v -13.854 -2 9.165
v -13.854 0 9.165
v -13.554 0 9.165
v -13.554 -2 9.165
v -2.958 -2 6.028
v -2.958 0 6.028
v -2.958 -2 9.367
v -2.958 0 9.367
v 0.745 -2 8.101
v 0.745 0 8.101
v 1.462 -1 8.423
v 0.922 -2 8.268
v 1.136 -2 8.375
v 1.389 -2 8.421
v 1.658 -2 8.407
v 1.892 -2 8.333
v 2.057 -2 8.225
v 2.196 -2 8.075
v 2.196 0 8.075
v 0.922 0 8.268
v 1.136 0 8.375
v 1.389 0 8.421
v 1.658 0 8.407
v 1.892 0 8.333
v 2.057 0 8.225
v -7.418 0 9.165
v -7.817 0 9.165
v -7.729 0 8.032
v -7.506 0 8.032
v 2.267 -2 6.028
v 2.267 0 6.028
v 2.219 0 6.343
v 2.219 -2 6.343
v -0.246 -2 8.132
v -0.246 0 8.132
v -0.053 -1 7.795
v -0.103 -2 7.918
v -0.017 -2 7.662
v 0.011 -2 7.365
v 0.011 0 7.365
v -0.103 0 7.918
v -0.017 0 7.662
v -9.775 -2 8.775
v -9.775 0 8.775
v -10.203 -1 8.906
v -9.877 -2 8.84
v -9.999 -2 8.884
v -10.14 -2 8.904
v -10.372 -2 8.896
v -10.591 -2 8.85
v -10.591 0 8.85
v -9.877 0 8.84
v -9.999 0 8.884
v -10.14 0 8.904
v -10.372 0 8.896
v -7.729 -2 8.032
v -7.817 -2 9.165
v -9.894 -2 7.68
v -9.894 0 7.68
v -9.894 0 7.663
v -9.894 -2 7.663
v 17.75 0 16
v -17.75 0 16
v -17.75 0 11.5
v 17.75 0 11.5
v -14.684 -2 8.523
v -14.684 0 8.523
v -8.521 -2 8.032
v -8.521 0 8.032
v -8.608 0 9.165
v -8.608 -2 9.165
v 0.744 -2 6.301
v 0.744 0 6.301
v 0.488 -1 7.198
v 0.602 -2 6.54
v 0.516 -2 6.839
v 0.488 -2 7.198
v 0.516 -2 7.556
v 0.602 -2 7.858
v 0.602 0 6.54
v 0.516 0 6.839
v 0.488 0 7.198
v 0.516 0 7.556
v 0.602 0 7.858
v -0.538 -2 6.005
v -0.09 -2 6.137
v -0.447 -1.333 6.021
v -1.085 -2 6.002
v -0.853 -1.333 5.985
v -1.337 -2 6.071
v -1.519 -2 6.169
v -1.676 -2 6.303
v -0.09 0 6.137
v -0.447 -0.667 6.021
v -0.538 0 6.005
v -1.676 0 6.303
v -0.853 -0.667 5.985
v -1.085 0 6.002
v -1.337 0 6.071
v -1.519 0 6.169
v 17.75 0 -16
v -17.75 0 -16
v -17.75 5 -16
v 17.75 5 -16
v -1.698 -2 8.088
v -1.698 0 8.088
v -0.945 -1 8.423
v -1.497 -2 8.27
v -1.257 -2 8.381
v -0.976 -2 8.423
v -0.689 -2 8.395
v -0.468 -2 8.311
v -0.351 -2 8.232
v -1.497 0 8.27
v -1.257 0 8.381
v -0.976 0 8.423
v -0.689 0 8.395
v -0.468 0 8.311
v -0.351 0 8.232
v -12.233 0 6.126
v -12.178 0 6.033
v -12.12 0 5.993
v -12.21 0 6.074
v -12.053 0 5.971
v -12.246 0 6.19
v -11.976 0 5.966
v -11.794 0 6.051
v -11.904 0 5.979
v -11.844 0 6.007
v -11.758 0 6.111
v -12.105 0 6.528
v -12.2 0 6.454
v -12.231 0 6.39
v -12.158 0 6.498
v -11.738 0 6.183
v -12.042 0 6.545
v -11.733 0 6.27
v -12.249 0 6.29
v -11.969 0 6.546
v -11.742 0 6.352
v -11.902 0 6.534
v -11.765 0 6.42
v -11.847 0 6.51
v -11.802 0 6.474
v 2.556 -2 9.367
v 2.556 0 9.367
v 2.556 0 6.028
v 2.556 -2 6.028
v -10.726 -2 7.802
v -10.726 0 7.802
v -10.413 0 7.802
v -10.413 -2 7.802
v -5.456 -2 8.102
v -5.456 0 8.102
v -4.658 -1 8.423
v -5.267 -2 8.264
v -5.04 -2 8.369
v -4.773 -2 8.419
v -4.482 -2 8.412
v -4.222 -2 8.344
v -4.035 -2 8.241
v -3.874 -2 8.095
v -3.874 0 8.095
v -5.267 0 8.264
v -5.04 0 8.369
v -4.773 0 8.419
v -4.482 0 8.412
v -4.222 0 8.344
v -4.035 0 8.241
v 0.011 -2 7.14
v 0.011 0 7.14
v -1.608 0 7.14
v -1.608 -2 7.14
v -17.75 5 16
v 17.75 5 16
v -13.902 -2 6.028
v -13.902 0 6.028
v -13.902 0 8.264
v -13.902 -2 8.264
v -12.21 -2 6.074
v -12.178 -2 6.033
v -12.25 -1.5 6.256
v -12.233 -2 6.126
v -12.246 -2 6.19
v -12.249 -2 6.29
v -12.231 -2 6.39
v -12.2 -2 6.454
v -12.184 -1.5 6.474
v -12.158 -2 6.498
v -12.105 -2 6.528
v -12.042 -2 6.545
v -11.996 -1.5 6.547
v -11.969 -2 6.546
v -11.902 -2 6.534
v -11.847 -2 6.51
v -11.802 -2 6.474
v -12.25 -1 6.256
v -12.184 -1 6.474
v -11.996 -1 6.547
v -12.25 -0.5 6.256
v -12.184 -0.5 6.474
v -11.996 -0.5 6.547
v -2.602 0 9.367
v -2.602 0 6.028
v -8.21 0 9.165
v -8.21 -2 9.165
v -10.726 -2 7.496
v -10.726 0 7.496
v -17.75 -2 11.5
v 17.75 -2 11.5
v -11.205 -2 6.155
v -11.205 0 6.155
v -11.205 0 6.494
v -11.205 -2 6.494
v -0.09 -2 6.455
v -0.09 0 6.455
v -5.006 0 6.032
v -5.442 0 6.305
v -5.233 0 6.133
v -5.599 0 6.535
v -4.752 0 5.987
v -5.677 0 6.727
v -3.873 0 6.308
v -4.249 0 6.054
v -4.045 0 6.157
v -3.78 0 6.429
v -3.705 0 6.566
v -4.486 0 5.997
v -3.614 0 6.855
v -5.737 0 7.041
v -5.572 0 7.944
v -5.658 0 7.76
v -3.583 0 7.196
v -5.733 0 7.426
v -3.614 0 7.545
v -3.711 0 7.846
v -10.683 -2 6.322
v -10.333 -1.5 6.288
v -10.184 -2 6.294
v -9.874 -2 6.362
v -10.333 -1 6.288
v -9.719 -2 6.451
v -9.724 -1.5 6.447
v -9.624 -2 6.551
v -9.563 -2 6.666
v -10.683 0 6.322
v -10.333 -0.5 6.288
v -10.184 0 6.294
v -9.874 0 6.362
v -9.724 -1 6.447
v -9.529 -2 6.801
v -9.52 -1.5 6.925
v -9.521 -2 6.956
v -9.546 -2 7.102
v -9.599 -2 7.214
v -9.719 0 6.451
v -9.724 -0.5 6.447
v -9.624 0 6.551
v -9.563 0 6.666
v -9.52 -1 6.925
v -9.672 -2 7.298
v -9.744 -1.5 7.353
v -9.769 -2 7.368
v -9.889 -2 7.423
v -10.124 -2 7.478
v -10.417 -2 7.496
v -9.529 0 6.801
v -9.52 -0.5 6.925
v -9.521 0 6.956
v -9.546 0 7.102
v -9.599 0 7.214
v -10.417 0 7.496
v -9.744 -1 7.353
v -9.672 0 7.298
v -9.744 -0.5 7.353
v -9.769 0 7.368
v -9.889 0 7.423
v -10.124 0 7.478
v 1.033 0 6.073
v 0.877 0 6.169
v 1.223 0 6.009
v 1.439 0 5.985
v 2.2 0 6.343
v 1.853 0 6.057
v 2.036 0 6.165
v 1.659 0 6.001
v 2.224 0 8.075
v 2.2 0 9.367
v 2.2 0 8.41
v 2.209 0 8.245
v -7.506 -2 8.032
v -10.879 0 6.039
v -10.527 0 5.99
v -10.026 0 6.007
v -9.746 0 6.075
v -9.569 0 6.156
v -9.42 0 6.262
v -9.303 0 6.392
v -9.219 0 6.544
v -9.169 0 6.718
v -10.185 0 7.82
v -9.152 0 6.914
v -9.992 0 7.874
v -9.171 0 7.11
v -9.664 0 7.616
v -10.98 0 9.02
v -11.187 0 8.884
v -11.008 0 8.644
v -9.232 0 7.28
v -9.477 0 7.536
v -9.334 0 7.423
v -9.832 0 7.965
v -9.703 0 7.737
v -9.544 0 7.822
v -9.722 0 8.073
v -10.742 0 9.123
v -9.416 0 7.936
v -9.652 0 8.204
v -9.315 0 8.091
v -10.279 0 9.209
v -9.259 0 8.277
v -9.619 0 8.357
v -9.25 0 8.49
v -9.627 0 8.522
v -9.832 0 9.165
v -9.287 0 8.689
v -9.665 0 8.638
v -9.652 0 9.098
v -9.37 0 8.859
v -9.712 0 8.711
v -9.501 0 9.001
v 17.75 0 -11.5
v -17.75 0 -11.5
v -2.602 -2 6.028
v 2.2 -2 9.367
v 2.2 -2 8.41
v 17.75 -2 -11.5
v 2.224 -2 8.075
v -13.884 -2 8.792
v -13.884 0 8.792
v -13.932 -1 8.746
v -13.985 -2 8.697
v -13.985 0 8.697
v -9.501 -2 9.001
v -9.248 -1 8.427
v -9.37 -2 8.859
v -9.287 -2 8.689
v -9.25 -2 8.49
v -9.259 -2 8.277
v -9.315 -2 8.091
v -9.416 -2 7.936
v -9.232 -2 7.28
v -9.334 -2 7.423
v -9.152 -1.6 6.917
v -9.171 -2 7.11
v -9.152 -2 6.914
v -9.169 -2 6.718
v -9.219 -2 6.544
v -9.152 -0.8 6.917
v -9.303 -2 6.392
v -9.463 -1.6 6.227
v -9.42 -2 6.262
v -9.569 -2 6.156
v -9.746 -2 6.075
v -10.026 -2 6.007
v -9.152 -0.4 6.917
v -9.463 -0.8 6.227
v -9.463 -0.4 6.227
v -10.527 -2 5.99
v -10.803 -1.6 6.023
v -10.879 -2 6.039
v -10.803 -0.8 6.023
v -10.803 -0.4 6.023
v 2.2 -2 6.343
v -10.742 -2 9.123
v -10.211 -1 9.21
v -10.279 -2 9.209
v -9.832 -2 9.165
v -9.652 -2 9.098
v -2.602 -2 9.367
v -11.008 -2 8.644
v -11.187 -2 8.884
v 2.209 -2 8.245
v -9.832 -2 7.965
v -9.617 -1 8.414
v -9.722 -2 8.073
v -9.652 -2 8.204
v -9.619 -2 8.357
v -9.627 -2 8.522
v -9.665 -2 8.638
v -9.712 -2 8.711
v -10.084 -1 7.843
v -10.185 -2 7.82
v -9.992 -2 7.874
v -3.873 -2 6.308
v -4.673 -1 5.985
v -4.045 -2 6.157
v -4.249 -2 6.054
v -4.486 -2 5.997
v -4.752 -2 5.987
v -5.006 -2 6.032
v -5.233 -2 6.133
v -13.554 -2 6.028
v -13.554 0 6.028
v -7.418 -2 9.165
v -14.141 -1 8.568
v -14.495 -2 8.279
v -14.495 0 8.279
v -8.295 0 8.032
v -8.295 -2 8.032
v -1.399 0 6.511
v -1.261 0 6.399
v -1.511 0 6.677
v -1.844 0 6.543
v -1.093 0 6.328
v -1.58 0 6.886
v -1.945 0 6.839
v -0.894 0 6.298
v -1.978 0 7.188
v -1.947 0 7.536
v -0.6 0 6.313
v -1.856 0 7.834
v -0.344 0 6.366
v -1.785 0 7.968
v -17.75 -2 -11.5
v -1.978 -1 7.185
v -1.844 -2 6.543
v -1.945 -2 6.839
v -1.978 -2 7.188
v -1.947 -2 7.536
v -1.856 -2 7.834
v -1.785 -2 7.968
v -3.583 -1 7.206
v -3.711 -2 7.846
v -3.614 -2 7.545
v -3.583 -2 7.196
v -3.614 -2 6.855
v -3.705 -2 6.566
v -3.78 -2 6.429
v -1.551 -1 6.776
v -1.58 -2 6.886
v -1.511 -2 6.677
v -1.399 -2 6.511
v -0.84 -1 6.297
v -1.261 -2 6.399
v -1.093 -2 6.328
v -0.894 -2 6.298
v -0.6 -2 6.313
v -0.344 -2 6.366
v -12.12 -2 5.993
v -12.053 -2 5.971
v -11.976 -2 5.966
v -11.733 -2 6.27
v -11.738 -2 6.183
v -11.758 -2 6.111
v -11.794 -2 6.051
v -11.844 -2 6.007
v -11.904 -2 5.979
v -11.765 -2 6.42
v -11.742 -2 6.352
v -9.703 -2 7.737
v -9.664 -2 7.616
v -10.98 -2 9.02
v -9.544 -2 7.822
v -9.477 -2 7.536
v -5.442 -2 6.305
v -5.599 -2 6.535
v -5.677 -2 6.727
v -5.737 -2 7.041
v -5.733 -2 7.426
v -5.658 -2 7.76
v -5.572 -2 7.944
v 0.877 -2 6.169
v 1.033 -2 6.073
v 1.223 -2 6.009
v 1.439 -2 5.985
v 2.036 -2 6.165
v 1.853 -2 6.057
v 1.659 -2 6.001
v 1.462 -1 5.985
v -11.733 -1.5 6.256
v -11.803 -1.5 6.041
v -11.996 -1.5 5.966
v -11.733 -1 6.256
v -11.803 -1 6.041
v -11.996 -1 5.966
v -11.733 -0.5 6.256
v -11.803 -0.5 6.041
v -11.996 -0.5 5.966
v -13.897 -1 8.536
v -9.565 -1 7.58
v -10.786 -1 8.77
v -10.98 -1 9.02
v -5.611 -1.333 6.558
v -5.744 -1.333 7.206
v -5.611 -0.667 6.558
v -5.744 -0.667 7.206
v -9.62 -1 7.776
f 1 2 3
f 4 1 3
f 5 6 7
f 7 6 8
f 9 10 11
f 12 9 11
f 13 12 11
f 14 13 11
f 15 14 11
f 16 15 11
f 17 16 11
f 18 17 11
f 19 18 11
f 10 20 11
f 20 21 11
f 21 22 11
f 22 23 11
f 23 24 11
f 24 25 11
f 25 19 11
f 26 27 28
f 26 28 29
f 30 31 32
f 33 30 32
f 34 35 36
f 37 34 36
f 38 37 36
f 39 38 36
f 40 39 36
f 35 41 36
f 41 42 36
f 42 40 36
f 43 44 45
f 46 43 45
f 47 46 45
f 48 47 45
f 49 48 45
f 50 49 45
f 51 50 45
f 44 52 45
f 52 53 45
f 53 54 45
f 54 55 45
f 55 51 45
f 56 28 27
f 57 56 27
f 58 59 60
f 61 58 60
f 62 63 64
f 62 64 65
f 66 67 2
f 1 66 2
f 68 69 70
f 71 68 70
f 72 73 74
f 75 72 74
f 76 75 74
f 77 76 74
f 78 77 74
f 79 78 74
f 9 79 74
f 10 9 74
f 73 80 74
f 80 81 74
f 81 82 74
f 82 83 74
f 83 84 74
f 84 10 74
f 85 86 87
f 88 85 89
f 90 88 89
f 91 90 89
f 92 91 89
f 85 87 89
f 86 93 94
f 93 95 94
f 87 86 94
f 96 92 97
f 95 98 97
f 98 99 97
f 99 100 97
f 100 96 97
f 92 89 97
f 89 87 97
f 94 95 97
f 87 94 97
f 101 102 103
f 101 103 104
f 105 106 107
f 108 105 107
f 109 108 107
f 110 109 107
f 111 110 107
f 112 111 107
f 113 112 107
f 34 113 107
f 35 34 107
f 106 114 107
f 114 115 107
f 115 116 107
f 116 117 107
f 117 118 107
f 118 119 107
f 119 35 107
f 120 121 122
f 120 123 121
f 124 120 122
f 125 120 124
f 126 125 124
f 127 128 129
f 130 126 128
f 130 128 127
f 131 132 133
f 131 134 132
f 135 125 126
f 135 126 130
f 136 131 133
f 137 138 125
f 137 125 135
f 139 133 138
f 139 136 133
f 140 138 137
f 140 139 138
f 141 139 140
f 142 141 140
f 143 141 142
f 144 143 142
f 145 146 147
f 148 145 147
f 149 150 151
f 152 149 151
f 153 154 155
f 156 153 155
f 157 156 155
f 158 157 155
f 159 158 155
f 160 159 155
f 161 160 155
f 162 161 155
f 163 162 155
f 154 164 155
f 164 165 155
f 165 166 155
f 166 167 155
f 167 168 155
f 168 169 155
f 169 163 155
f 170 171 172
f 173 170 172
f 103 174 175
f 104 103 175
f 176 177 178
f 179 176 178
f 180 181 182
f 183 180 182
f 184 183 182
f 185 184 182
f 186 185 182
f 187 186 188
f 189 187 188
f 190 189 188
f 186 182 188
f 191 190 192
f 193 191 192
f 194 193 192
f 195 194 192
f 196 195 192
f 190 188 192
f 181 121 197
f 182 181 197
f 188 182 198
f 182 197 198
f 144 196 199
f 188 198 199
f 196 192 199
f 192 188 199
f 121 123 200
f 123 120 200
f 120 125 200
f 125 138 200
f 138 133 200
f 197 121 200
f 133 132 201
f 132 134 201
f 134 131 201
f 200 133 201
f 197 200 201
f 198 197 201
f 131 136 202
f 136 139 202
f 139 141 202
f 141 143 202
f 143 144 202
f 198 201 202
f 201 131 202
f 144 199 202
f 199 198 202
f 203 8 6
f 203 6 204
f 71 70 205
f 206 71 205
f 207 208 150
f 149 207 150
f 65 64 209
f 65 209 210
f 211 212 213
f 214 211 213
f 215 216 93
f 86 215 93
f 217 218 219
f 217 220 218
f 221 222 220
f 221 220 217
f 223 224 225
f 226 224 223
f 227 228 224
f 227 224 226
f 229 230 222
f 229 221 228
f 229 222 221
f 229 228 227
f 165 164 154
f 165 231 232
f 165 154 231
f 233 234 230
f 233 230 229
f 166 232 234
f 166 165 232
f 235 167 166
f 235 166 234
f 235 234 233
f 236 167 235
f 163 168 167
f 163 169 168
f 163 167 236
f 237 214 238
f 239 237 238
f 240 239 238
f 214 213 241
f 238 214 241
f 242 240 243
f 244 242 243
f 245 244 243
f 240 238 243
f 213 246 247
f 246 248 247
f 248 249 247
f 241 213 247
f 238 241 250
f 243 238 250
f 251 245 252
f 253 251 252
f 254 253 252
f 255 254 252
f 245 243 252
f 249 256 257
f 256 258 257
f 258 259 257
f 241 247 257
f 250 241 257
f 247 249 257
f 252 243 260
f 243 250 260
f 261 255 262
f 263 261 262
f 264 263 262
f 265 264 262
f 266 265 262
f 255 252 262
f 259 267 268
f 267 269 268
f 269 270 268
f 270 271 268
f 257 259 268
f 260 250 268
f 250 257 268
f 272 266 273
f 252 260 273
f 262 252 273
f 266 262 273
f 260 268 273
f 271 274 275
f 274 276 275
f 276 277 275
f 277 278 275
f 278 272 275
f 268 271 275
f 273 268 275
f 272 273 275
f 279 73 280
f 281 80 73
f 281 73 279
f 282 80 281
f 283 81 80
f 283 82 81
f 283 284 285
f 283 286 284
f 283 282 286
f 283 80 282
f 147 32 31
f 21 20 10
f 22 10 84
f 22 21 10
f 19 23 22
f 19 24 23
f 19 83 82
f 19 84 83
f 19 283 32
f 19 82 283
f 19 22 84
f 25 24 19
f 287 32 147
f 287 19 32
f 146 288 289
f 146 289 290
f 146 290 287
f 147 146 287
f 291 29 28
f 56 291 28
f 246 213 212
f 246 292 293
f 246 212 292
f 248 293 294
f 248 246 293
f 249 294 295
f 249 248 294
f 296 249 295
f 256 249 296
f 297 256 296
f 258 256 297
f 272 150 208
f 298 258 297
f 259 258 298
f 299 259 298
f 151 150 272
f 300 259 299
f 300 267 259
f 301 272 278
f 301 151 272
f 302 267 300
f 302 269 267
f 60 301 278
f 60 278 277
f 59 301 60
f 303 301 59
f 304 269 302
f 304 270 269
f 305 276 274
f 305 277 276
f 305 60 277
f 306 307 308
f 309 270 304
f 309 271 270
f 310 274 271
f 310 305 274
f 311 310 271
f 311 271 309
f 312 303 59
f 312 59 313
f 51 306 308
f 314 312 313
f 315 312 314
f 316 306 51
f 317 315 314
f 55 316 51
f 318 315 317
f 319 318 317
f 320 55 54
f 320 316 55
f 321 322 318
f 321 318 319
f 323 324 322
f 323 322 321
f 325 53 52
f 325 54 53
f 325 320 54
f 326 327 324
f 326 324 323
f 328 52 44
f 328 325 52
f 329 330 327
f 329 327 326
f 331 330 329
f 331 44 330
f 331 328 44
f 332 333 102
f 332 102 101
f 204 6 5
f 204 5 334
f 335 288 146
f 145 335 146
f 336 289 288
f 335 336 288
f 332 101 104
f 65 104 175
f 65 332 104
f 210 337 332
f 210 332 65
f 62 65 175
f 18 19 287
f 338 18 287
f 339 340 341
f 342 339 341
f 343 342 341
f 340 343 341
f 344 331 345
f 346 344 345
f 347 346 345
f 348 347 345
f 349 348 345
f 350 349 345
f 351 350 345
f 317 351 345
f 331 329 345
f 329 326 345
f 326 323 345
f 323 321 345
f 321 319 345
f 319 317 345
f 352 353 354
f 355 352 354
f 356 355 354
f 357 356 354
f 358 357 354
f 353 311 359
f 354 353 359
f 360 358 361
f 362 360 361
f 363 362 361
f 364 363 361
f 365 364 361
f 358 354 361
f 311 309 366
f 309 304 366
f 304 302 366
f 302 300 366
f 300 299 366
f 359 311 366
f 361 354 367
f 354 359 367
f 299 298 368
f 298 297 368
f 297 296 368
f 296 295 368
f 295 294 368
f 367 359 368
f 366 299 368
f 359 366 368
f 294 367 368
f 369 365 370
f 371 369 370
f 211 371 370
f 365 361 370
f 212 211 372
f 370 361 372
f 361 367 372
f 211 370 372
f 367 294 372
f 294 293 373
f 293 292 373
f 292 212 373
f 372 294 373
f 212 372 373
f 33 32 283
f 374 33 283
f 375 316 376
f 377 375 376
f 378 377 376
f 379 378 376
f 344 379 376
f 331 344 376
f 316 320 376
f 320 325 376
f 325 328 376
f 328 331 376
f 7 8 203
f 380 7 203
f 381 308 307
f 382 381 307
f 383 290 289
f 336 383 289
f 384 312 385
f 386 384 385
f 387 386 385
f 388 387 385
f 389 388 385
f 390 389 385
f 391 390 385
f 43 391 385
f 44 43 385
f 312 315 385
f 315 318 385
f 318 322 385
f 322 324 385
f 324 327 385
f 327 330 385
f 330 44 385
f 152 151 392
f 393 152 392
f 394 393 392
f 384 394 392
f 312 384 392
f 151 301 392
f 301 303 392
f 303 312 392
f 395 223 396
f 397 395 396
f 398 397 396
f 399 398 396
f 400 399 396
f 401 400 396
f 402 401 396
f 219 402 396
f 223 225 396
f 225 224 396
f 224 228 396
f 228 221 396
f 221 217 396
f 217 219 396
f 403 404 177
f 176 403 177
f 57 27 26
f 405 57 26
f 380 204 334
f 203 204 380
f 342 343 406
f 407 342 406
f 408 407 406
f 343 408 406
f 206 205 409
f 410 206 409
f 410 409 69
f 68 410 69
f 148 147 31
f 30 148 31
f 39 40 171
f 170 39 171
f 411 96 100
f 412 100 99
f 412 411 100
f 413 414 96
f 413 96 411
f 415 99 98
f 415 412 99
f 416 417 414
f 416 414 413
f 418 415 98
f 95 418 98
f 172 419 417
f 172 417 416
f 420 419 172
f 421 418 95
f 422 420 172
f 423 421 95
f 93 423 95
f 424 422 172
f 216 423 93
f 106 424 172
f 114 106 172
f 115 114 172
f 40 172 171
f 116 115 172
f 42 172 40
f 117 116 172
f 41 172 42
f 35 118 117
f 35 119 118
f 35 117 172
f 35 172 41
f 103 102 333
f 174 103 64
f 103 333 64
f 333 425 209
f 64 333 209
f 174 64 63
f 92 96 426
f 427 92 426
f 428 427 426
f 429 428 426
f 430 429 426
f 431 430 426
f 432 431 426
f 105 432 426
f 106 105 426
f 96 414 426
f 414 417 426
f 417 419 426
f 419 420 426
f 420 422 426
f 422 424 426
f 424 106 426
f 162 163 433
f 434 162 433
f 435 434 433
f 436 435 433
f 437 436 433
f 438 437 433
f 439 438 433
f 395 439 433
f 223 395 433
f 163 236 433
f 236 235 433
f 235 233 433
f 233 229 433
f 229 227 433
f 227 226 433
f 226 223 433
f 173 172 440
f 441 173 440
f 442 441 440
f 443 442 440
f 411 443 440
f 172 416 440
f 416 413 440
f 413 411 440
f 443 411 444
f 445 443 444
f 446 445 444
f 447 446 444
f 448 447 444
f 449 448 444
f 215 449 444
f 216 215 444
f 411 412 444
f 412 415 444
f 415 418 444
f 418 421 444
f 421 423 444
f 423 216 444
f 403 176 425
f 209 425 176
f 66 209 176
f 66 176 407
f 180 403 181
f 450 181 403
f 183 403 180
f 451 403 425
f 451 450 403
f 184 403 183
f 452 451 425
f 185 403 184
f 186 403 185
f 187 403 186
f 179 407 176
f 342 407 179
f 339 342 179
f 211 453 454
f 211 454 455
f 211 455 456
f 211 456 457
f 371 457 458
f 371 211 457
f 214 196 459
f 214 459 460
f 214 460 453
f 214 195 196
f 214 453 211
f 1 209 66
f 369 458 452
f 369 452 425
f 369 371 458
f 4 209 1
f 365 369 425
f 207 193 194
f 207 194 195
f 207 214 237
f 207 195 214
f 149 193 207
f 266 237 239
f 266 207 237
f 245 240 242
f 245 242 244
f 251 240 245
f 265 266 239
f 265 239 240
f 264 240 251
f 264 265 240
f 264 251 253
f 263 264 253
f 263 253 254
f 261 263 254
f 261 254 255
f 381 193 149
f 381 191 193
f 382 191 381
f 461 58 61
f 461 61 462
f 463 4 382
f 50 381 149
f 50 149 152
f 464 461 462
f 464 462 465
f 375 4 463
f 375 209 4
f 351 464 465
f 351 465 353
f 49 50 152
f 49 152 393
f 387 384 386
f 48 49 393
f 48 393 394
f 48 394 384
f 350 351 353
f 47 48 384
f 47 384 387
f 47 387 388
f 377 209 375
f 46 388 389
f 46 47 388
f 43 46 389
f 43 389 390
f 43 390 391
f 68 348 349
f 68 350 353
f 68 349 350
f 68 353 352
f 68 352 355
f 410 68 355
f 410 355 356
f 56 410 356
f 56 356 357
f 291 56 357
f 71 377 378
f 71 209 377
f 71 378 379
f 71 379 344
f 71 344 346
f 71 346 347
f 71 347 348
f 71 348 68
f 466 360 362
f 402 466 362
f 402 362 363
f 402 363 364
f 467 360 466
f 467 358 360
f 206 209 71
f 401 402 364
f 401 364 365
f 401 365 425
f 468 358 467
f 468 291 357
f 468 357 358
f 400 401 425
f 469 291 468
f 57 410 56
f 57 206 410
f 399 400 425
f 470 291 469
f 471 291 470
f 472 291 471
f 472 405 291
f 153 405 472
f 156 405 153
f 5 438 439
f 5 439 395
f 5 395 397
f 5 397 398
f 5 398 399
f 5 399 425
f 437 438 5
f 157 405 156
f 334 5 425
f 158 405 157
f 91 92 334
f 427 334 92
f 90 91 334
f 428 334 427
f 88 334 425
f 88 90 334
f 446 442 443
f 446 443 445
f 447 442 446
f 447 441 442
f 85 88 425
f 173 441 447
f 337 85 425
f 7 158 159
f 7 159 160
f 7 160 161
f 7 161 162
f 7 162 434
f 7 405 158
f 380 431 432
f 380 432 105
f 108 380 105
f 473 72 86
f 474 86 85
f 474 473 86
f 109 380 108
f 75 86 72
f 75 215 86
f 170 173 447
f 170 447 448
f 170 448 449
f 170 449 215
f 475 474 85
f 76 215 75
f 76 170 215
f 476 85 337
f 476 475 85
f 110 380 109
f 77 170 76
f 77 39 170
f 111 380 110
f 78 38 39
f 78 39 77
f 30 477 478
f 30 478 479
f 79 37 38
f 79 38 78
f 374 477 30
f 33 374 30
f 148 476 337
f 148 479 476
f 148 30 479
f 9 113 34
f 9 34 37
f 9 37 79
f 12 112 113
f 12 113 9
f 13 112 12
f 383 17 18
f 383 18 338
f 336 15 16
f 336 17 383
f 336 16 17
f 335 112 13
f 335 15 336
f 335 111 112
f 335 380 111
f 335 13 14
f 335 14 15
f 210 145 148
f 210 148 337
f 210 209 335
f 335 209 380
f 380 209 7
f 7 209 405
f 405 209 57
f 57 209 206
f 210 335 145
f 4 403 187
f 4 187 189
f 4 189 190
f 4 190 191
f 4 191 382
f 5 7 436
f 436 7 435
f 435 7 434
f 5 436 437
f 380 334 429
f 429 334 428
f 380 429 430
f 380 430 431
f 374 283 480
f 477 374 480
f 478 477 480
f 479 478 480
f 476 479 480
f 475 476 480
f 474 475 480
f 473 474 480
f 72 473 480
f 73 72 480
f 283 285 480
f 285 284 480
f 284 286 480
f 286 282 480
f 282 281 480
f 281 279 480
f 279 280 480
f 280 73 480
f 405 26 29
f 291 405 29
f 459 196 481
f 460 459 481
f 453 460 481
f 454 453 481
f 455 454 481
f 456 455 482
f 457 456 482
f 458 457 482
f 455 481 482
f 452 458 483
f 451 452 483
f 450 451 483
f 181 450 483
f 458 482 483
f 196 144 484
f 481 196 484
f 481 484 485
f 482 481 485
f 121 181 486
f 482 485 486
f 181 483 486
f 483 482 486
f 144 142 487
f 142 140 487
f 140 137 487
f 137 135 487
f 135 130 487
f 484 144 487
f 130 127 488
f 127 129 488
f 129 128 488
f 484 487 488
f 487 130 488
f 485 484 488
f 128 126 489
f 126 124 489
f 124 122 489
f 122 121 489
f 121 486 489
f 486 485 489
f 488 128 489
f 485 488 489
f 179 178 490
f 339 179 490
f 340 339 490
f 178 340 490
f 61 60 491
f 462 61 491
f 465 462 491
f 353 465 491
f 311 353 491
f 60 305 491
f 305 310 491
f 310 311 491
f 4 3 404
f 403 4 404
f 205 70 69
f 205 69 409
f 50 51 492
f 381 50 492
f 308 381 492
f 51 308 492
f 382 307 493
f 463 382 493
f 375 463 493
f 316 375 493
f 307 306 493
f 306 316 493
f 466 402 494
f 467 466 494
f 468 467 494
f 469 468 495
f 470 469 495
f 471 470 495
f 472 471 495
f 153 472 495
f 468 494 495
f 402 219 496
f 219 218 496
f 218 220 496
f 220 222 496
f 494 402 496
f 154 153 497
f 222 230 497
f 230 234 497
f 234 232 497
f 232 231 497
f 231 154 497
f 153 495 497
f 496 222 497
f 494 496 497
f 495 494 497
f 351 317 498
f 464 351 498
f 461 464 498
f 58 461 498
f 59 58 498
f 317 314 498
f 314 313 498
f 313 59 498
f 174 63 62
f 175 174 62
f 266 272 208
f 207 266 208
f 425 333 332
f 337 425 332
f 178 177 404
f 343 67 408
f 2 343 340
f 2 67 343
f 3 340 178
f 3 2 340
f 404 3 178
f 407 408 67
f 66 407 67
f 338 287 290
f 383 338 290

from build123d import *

# Parameters (mm, degrees)
F0_W     = 35.5
F0_H     = 23
F0_W_2   = 0.3563508465
F0_H_2   = 3.3389868337
F1_DEPTH = 2
F2_W     = 35.5
F2_H     = 32
F3_DEPTH = 5


with BuildPart() as f1:
    # F0 (on Front) → F1 (new body)
    with BuildSketch(Plane.XZ):
        Rectangle(F0_W, F0_H)
        with BuildLine():
            Line((-13.5541488121, 9.1653992852), (-13.5541488121, 6.0282759368))
            Line((-13.5541488121, 6.0282759368), (-13.9015737223, 6.0282759368))
            Line((-13.9015737223, 6.0282759368), (-13.9015737223, 8.2638797062))
            add(Edge.make_bspline(
                [(-13.9015737223, 8.2638797062), (-13.9015737223, 8.5433301774), (-13.8844084599, 8.7918831763)],
                knots=[0, 0, 0, 1, 1, 1], degree=2))
            add(Edge.make_bspline(
                [(-13.8844084599, 8.7918831763), (-13.929038142, 8.7465668837), (-13.9849968973, 8.6974742334)],
                knots=[0, 0, 0, 1, 1, 1], degree=2))
            add(Edge.make_bspline(
                [(-13.9849968973, 8.6974742334), (-14.0409556526, 8.648381583), (-14.4954917998, 8.2789851371)],
                knots=[0, 0, 0, 1, 1, 1], degree=2))
            Line((-14.4954917998, 8.2789851371), (-14.6843096857, 8.5234184731))
            Line((-14.6843096857, 8.5234184731), (-13.8541975981, 9.1653992852))
            Line((-13.8541975981, 9.1653992852), (-13.5541488121, 9.1653992852))
        make_face(mode=Mode.SUBTRACT)
        with BuildLine():
            add(Edge.make_bspline(
                [(-12.1778380763, 6.0334255155), (-12.249588873, 6.1010566492), (-12.249588873, 6.2555440105)],
                knots=[0, 0, 0, 1, 1, 1], degree=2))
            add(Edge.make_bspline(
                [(-12.249588873, 6.2555440105), (-12.249588873, 6.3997322143), (-12.1840175708, 6.4735428424)],
                knots=[0, 0, 0, 1, 1, 1], degree=2))
            add(Edge.make_bspline(
                [(-12.1840175708, 6.4735428424), (-12.1184462686, 6.5473534705), (-11.9962296006, 6.5473534705)],
                knots=[0, 0, 0, 1, 1, 1], degree=2))
            add(Edge.make_bspline(
                [(-11.9962296006, 6.5473534705), (-11.8719531011, 6.5473534705), (-11.802262136, 6.4735428424)],
                knots=[0, 0, 0, 1, 1, 1], degree=2))
            add(Edge.make_bspline(
                [(-11.802262136, 6.4735428424), (-11.7325711708, 6.3997322143), (-11.7325711708, 6.2555440105)],
                knots=[0, 0, 0, 1, 1, 1], degree=2))
            add(Edge.make_bspline(
                [(-11.7325711708, 6.2555440105), (-11.7325711708, 6.1161620801), (-11.8032920517, 6.040978231)],
                knots=[0, 0, 0, 1, 1, 1], degree=2))
            add(Edge.make_bspline(
                [(-11.8032920517, 6.040978231), (-11.8740129326, 5.9657943819), (-11.9962296006, 5.9657943819)],
                knots=[0, 0, 0, 1, 1, 1], degree=2))
            add(Edge.make_bspline(
                [(-11.9962296006, 5.9657943819), (-12.1060872797, 5.9657943819), (-12.1778380763, 6.0334255155)],
                knots=[0, 0, 0, 1, 1, 1], degree=2))
        make_face(mode=Mode.SUBTRACT)
        with BuildLine():
            add(Edge.make_bspline(
                [(-9.5010870644, 9.0009560719), (-9.247727792, 8.7918831763), (-9.247727792, 8.4272930039)],
                knots=[0, 0, 0, 1, 1, 1], degree=2))
            add(Edge.make_bspline(
                [(-9.247727792, 8.4272930039), (-9.247727792, 8.1265576074), (-9.4162906683, 7.93567989)],
                knots=[0, 0, 0, 1, 1, 1], degree=2))
            add(Edge.make_bspline(
                [(-9.4162906683, 7.93567989), (-9.5848535447, 7.7448021726), (-9.8938282671, 7.6802607861)],
                knots=[0, 0, 0, 1, 1, 1], degree=2))
            Line((-9.8938282671, 7.6802607861), (-9.8938282671, 7.6630955237))
            add(Edge.make_bspline(
                [(-9.8938282671, 7.6630955237), (-9.5161924952, 7.6164060101), (-9.333897409, 7.423125156)],
                knots=[0, 0, 0, 1, 1, 1], degree=2))
            add(Edge.make_bspline(
                [(-9.333897409, 7.423125156), (-9.1516023228, 7.2298443018), (-9.1516023228, 6.9167499165)],
                knots=[0, 0, 0, 1, 1, 1], degree=2))
            add(Edge.make_bspline(
                [(-9.1516023228, 6.9167499165), (-9.1516023228, 6.4683932637), (-9.4626368767, 6.2267063697)],
                knots=[0, 0, 0, 1, 1, 1], degree=2))
            add(Edge.make_bspline(
                [(-9.4626368767, 6.2267063697), (-9.7736714306, 5.9850194757), (-10.3463045828, 5.9850194757)],
                knots=[0, 0, 0, 1, 1, 1], degree=2))
            add(Edge.make_bspline(
                [(-10.3463045828, 5.9850194757), (-10.5955441923, 5.9850194757), (-10.8025572563, 6.0227830529)],
                knots=[0, 0, 0, 1, 1, 1], degree=2))
            add(Edge.make_bspline(
                [(-10.8025572563, 6.0227830529), (-11.0095703203, 6.0605466301), (-11.2045677007, 6.1546122678)],
                knots=[0, 0, 0, 1, 1, 1], degree=2))
            Line((-11.2045677007, 6.1546122678), (-11.2045677007, 6.493797852))
            add(Edge.make_bspline(
                [(-11.2045677007, 6.493797852), (-11.0006443839, 6.3928661093), (-10.7699432578, 6.3403404065)],
                knots=[0, 0, 0, 1, 1, 1], degree=2))
            add(Edge.make_bspline(
                [(-10.7699432578, 6.3403404065), (-10.5392421317, 6.2878147037), (-10.3332589834, 6.2878147037)],
                knots=[0, 0, 0, 1, 1, 1], degree=2))
            add(Edge.make_bspline(
                [(-10.3332589834, 6.2878147037), (-9.5203121582, 6.2878147037), (-9.5203121582, 6.9249892424)],
                knots=[0, 0, 0, 1, 1, 1], degree=2))
            add(Edge.make_bspline(
                [(-9.5203121582, 6.9249892424), (-9.5203121582, 7.4962491736), (-10.4170254637, 7.4962491736)],
                knots=[0, 0, 0, 1, 1, 1], degree=2))
            Line((-10.4170254637, 7.4962491736), (-10.7260001862, 7.4962491736))
            Line((-10.7260001862, 7.4962491736), (-10.7260001862, 7.8024774541))
            Line((-10.7260001862, 7.8024774541), (-10.4129058008, 7.8024774541))
            add(Edge.make_bspline(
                [(-10.4129058008, 7.8024774541), (-10.0462557968, 7.8024774541), (-9.8316900174, 7.9645175307)],
                knots=[0, 0, 0, 1, 1, 1], degree=2))
            add(Edge.make_bspline(
                [(-9.8316900174, 7.9645175307), (-9.6171242379, 8.1265576074), (-9.6171242379, 8.4142474045)],
                knots=[0, 0, 0, 1, 1, 1], degree=2))
            add(Edge.make_bspline(
                [(-9.6171242379, 8.4142474045), (-9.6171242379, 8.6435753096), (-9.7747013463, 8.774717914)],
                knots=[0, 0, 0, 1, 1, 1], degree=2))
            add(Edge.make_bspline(
                [(-9.7747013463, 8.774717914), (-9.9322784548, 8.9058605184), (-10.2028029895, 8.9058605184)],
                knots=[0, 0, 0, 1, 1, 1], degree=2))
            add(Edge.make_bspline(
                [(-10.2028029895, 8.9058605184), (-10.4087861378, 8.9058605184), (-10.591081224, 8.8499017631)],
                knots=[0, 0, 0, 1, 1, 1], degree=2))
            add(Edge.make_bspline(
                [(-10.591081224, 8.8499017631), (-10.7733763103, 8.7939430078), (-11.0075104888, 8.6435753096)],
                knots=[0, 0, 0, 1, 1, 1], degree=2))
            Line((-11.0075104888, 8.6435753096), (-11.1874024383, 8.8838889826))
            add(Edge.make_bspline(
                [(-11.1874024383, 8.8838889826), (-10.9944648894, 9.0363165123), (-10.742478838, 9.1231727398)],
                knots=[0, 0, 0, 1, 1, 1], degree=2))
            add(Edge.make_bspline(
                [(-10.742478838, 9.1231727398), (-10.4904927866, 9.2100289674), (-10.2110423155, 9.2100289674)],
                knots=[0, 0, 0, 1, 1, 1], degree=2))
            add(Edge.make_bspline(
                [(-10.2110423155, 9.2100289674), (-9.7544463368, 9.2100289674), (-9.5010870644, 9.0009560719)],
                knots=[0, 0, 0, 1, 1, 1], degree=2))
        make_face(mode=Mode.SUBTRACT)
        Polygon((-8.6084934218, 9.1653992852), (-8.2095727246, 9.1653992852), (-8.2953990364, 8.0324919697), (-8.5206072785, 8.0324919697), align=None, mode=Mode.SUBTRACT)
        Polygon((-7.8168315219, 9.1653992852), (-7.4179108247, 9.1653992852), (-7.505796968, 8.0324919697), (-7.7289453786, 8.0324919697), align=None, mode=Mode.SUBTRACT)
        with BuildLine():
            add(Edge.make_bspline(
                [(-3.8739707584, 8.0946302194), (-3.5831912141, 7.7660870979), (-3.5831912141, 7.206499545)],
                knots=[0, 0, 0, 1, 1, 1], degree=2))
            add(Edge.make_bspline(
                [(-3.5831912141, 7.206499545), (-3.5831912141, 6.6311199508), (-3.8725975374, 6.3080697133)],
                knots=[0, 0, 0, 1, 1, 1], degree=2))
            add(Edge.make_bspline(
                [(-3.8725975374, 6.3080697133), (-4.1620038608, 5.9850194757), (-4.6728420685, 5.9850194757)],
                knots=[0, 0, 0, 1, 1, 1], degree=2))
            add(Edge.make_bspline(
                [(-4.6728420685, 5.9850194757), (-4.9886828959, 5.9850194757), (-5.2331162319, 6.1333273425)],
                knots=[0, 0, 0, 1, 1, 1], degree=2))
            add(Edge.make_bspline(
                [(-5.2331162319, 6.1333273425), (-5.4775495678, 6.2816352092), (-5.6107520037, 6.5583392384)],
                knots=[0, 0, 0, 1, 1, 1], degree=2))
            add(Edge.make_bspline(
                [(-5.6107520037, 6.5583392384), (-5.7439544396, 6.8350432676), (-5.7439544396, 7.206499545)],
                knots=[0, 0, 0, 1, 1, 1], degree=2))
            add(Edge.make_bspline(
                [(-5.7439544396, 7.206499545), (-5.7439544396, 7.7811925288), (-5.4562646425, 8.1021829348)],
                knots=[0, 0, 0, 1, 1, 1], degree=2))
            add(Edge.make_bspline(
                [(-5.4562646425, 8.1021829348), (-5.1685748454, 8.4231733409), (-4.6577366377, 8.4231733409)],
                knots=[0, 0, 0, 1, 1, 1], degree=2))
            add(Edge.make_bspline(
                [(-4.6577366377, 8.4231733409), (-4.1647503028, 8.4231733409), (-3.8739707584, 8.0946302194)],
                knots=[0, 0, 0, 1, 1, 1], degree=2))
        make_face(mode=Mode.SUBTRACT)
        with Locations((-2.780200241, 7.6977693537)):
            Rectangle(F0_W_2, F0_H_2, mode=Mode.SUBTRACT)
        with BuildLine():
            add(Edge.make_bspline(
                [(-0.4467544762, 6.0207232214), (-0.6149740473, 5.9850194757), (-0.8532278888, 5.9850194757)],
                knots=[0, 0, 0, 1, 1, 1], degree=2))
            add(Edge.make_bspline(
                [(-0.8532278888, 5.9850194757), (-1.374365254, 5.9850194757), (-1.6761305662, 6.3029201346)],
                knots=[0, 0, 0, 1, 1, 1], degree=2))
            add(Edge.make_bspline(
                [(-1.6761305662, 6.3029201346), (-1.9778958785, 6.6208207934), (-1.9778958785, 7.1845280092)],
                knots=[0, 0, 0, 1, 1, 1], degree=2))
            add(Edge.make_bspline(
                [(-1.9778958785, 7.1845280092), (-1.9778958785, 7.753728109), (-1.6977587968, 8.088450725)],
                knots=[0, 0, 0, 1, 1, 1], degree=2))
            add(Edge.make_bspline(
                [(-1.6977587968, 8.088450725), (-1.4176217151, 8.4231733409), (-0.945233695, 8.4231733409)],
                knots=[0, 0, 0, 1, 1, 1], degree=2))
            add(Edge.make_bspline(
                [(-0.945233695, 8.4231733409), (-0.5037431472, 8.4231733409), (-0.2462642119, 8.1323937966)],
                knots=[0, 0, 0, 1, 1, 1], degree=2))
            add(Edge.make_bspline(
                [(-0.2462642119, 8.1323937966), (0.0112147235, 7.8416142523), (0.0112147235, 7.3651065692)],
                knots=[0, 0, 0, 1, 1, 1], degree=2))
            Line((0.0112147235, 7.3651065692), (0.0112147235, 7.1398983271))
            Line((0.0112147235, 7.1398983271), (-1.6084994325, 7.1398983271))
            add(Edge.make_bspline(
                [(-1.6084994325, 7.1398983271), (-1.5975136646, 6.725872199), (-1.3990832318, 6.5113064196)],
                knots=[0, 0, 0, 1, 1, 1], degree=2))
            add(Edge.make_bspline(
                [(-1.3990832318, 6.5113064196), (-1.2006527989, 6.2967406401), (-0.8401822894, 6.2967406401)],
                knots=[0, 0, 0, 1, 1, 1], degree=2))
            add(Edge.make_bspline(
                [(-0.8401822894, 6.2967406401), (-0.4604866861, 6.2967406401), (-0.0897170192, 6.4553476643)],
                knots=[0, 0, 0, 1, 1, 1], degree=2))
            Line((-0.0897170192, 6.4553476643), (-0.0897170192, 6.1374470054))
            add(Edge.make_bspline(
                [(-0.0897170192, 6.1374470054), (-0.2785349051, 6.0564269671), (-0.4467544762, 6.0207232214)],
                knots=[0, 0, 0, 1, 1, 1], degree=2))
        make_face(mode=Mode.SUBTRACT)
        with BuildLine():
            Line((2.2667301972, 6.0282759368), (2.2193540731, 6.3434301537))
            Line((2.2193540731, 6.3434301537), (2.2001289793, 6.3434301537))
            add(Edge.make_bspline(
                [(2.2001289793, 6.3434301537), (1.9536358118, 5.9850194757), (1.4620226979, 5.9850194757)],
                knots=[0, 0, 0, 1, 1, 1], degree=2))
            add(Edge.make_bspline(
                [(1.4620226979, 5.9850194757), (1.0006204458, 5.9850194757), (0.7441714262, 6.3005169978)],
                knots=[0, 0, 0, 1, 1, 1], degree=2))
            add(Edge.make_bspline(
                [(0.7441714262, 6.3005169978), (0.4877224065, 6.61601452), (0.4877224065, 7.1975736086)],
                knots=[0, 0, 0, 1, 1, 1], degree=2))
            add(Edge.make_bspline(
                [(0.4877224065, 7.1975736086), (0.4877224065, 7.7791326973), (0.7452013419, 8.1011530191)],
                knots=[0, 0, 0, 1, 1, 1], degree=2))
            add(Edge.make_bspline(
                [(0.7452013419, 8.1011530191), (1.0026802772, 8.4231733409), (1.4620226979, 8.4231733409)],
                knots=[0, 0, 0, 1, 1, 1], degree=2))
            add(Edge.make_bspline(
                [(1.4620226979, 8.4231733409), (1.9405902124, 8.4231733409), (2.1960093163, 8.0750618203)],
                knots=[0, 0, 0, 1, 1, 1], degree=2))
            Line((2.1960093163, 8.0750618203), (2.2241603466, 8.0750618203))
            Line((2.2241603466, 8.0750618203), (2.2090549157, 8.2446546124))
            Line((2.2090549157, 8.2446546124), (2.2001289793, 8.4101277415))
            Line((2.2001289793, 8.4101277415), (2.2001289793, 9.3672627706))
            Line((2.2001289793, 9.3672627706), (2.5564798258, 9.3672627706))
            Line((2.5564798258, 9.3672627706), (2.5564798258, 6.0282759368))
            Line((2.5564798258, 6.0282759368), (2.2667301972, 6.0282759368))
        make_face(mode=Mode.SUBTRACT)
    extrude(amount=F1_DEPTH)

    # F2 (on Front) → F3 (join)
    with BuildSketch(Plane.XZ):
        Rectangle(F2_W, F2_H)
    extrude(amount=-F3_DEPTH)


solid = f1.part
